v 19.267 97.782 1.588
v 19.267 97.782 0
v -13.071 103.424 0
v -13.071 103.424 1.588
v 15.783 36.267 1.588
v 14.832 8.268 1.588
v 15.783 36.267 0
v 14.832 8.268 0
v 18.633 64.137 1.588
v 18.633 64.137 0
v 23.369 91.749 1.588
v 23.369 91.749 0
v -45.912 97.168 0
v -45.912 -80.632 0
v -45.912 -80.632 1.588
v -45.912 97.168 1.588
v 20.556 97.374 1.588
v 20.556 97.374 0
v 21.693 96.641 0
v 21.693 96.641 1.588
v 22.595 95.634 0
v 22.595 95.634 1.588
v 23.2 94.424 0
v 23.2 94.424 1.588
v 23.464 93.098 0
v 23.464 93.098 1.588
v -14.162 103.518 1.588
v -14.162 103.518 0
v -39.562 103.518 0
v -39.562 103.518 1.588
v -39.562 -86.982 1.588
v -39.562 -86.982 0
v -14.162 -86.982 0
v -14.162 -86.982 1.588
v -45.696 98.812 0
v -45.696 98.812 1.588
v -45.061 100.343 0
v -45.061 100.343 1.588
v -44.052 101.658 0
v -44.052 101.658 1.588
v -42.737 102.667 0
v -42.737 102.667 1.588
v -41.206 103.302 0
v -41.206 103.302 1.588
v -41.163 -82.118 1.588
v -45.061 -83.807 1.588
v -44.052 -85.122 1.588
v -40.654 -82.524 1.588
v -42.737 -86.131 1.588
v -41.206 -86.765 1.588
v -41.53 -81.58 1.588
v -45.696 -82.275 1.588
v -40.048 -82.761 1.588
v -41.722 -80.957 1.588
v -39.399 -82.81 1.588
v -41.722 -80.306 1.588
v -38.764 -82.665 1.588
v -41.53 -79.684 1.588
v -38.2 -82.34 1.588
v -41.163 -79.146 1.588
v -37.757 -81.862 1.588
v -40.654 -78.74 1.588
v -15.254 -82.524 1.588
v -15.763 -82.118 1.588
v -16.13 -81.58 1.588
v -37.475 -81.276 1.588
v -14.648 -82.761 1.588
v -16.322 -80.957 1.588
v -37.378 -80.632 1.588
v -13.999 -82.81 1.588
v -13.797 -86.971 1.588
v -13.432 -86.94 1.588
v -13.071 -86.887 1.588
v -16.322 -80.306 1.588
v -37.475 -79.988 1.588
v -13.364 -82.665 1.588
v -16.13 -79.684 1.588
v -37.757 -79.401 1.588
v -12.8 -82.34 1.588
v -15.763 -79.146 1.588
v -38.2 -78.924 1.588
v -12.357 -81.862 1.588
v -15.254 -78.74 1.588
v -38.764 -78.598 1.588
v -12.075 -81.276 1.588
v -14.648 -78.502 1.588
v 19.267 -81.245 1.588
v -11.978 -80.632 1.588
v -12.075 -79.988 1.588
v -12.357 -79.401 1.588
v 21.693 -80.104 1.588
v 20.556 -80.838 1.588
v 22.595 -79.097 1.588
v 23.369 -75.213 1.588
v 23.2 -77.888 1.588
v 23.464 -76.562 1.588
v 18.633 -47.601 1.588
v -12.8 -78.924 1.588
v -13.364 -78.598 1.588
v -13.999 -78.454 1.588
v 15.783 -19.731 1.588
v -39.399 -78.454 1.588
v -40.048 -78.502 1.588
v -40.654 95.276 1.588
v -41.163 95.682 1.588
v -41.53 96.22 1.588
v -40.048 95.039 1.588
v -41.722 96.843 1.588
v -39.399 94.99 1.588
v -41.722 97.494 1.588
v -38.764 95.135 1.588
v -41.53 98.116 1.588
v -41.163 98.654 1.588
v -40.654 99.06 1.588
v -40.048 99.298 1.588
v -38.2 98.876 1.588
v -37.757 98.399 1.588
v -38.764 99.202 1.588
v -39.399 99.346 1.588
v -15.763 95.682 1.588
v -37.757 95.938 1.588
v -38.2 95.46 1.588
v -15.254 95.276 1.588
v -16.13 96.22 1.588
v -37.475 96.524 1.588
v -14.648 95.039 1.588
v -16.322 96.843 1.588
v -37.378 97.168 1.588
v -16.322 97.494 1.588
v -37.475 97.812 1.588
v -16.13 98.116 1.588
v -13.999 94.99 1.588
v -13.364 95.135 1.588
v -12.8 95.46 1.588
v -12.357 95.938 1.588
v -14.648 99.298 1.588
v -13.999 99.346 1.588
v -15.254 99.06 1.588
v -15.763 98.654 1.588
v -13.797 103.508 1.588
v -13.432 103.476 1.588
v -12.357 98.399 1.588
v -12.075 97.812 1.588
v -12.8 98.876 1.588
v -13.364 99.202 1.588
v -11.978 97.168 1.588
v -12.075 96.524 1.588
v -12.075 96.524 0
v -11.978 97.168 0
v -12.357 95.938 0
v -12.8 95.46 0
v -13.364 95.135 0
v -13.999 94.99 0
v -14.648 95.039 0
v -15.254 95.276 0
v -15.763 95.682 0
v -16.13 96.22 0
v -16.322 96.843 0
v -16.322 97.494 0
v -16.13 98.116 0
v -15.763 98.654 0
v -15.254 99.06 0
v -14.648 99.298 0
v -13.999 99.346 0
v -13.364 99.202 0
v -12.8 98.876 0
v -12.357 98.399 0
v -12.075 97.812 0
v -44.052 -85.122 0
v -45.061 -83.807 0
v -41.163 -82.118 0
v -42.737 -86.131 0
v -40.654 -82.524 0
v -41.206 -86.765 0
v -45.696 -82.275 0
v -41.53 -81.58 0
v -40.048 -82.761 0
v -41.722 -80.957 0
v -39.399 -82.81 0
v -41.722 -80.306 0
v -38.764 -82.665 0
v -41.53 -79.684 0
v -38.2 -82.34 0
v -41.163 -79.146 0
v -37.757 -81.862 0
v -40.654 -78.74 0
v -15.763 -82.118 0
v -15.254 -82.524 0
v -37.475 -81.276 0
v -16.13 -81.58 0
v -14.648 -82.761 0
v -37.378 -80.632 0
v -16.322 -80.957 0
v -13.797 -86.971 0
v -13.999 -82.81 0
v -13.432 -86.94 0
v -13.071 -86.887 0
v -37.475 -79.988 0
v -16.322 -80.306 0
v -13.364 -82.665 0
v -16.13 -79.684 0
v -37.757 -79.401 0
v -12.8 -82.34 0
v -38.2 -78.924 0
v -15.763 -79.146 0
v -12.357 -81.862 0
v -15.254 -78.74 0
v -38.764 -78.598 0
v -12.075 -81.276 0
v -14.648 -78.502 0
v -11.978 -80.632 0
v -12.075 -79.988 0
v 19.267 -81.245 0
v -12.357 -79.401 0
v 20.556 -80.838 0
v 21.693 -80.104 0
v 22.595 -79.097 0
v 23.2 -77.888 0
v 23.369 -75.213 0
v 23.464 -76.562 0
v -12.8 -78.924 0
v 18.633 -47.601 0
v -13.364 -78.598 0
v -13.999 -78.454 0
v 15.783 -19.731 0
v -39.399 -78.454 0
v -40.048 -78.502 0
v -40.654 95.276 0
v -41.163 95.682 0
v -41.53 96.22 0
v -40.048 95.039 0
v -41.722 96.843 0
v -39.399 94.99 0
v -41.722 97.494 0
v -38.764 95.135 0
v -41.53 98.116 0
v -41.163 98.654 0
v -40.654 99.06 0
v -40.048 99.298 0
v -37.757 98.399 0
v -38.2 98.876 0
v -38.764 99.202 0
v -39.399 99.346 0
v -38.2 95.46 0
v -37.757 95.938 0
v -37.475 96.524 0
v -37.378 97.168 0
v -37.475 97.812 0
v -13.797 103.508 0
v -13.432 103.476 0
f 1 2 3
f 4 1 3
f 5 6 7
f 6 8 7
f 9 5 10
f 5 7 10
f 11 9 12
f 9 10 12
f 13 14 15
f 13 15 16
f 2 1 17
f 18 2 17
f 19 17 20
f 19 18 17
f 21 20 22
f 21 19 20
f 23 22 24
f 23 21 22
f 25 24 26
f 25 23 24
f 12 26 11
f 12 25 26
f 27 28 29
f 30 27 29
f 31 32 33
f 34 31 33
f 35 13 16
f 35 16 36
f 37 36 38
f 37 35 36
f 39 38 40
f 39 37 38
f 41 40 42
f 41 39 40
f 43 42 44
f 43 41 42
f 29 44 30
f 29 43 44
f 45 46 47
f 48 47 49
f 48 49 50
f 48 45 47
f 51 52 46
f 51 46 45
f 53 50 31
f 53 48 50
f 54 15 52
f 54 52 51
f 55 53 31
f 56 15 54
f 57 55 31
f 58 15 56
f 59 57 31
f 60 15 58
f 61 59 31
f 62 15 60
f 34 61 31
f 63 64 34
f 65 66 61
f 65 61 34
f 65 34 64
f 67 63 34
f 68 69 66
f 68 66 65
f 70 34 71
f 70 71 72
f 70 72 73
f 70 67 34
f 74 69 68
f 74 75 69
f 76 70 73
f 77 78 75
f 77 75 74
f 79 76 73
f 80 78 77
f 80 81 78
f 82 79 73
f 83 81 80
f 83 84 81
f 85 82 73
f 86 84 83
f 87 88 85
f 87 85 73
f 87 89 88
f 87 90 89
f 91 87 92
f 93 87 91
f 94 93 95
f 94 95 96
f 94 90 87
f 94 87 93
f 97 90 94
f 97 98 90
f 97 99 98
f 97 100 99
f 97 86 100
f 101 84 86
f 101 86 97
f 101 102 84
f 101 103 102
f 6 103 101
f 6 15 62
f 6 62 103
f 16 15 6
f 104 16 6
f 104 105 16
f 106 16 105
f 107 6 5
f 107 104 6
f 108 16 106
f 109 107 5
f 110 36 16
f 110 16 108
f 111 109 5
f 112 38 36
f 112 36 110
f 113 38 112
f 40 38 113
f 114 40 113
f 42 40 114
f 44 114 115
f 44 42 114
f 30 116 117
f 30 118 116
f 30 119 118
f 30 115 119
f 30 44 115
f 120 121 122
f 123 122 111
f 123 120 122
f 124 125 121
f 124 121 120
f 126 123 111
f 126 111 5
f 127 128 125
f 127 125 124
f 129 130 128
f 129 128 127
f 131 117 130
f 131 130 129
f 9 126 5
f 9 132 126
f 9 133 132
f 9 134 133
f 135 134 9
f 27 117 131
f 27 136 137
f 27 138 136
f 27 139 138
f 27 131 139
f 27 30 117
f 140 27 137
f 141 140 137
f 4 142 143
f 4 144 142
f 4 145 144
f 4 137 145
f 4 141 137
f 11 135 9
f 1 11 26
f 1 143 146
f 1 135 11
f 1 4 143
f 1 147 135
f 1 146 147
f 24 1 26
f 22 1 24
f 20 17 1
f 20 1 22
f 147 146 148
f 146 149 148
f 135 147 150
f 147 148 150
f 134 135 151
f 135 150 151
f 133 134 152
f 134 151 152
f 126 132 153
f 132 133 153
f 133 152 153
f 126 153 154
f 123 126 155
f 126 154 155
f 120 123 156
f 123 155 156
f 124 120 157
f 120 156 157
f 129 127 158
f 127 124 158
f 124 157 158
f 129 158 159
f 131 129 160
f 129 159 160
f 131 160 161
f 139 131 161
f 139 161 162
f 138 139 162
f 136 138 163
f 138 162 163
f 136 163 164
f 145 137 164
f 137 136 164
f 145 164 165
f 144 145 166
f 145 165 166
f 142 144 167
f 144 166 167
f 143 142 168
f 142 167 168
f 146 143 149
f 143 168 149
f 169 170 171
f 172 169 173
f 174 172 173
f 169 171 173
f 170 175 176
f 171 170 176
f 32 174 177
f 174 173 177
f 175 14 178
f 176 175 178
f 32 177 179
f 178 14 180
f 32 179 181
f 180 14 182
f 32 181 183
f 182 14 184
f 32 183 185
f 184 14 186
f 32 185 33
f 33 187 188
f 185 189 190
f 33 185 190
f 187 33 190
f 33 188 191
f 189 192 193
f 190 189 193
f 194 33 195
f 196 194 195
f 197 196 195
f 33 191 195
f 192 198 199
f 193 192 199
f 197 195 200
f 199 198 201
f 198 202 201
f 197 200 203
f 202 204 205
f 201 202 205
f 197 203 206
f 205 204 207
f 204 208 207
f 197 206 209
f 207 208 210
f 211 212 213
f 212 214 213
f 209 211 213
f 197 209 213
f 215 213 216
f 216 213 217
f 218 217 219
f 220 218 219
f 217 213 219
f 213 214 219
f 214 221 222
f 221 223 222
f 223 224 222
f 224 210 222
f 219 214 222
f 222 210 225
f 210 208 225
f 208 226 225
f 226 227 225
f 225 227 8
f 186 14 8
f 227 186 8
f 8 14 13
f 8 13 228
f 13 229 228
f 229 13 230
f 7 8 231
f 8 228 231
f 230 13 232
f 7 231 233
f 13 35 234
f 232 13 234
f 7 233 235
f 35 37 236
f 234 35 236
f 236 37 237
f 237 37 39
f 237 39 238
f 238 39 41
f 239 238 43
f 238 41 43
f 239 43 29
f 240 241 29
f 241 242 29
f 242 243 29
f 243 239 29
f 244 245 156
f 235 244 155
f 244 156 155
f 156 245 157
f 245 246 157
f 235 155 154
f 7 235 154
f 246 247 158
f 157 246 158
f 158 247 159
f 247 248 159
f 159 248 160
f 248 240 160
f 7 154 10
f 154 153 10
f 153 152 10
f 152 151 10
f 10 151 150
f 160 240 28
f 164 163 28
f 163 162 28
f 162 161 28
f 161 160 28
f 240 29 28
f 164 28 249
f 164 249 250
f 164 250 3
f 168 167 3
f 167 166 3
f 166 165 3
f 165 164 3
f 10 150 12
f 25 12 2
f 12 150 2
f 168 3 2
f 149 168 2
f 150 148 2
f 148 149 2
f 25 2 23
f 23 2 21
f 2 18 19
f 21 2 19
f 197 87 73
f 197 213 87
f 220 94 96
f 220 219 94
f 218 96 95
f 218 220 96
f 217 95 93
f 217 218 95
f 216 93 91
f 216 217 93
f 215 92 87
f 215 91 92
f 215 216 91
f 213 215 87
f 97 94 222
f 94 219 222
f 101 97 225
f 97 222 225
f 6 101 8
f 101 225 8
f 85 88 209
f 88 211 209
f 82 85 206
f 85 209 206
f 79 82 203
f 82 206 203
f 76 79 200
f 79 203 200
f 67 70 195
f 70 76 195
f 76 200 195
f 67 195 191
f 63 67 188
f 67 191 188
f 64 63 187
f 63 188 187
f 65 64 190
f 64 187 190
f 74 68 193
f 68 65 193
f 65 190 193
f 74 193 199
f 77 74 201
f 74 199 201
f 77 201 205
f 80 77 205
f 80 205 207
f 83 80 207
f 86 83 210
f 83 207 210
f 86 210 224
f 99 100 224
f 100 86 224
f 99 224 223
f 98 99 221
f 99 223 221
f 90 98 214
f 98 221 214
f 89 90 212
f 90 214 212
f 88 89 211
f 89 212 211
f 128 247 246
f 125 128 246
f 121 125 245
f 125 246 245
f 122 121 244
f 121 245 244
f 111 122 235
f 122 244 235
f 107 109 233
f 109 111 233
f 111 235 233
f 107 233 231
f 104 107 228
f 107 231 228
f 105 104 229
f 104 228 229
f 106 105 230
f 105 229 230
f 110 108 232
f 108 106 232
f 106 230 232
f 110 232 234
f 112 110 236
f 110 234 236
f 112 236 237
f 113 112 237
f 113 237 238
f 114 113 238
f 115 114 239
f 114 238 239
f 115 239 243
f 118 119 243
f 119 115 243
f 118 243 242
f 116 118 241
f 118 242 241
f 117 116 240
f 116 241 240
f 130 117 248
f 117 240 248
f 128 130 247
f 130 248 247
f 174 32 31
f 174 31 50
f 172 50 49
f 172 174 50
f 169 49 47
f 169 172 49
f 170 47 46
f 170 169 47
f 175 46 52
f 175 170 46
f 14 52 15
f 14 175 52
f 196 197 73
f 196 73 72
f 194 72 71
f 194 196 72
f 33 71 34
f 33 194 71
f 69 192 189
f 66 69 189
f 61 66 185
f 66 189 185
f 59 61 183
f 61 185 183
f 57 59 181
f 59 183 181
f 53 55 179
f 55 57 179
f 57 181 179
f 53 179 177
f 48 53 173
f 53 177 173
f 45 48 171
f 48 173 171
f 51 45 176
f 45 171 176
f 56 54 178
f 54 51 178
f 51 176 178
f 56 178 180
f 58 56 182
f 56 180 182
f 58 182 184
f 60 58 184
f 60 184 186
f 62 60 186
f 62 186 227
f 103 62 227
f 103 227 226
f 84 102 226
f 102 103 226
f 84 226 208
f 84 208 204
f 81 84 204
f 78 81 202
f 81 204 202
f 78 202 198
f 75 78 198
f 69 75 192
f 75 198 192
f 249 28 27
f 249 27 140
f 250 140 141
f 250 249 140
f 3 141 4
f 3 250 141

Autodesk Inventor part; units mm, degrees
ref_plane "YZ Plane" through (0, 0, 0) normal (1, 0, 0) x (0, 1, 0)
ref_plane "XZ Plane" through (0, 0, 0) normal (0, 1, 0) x (-1, 0, 0)
ref_plane "XY Plane" through (0, 0, 0) normal (0, 0, 1) x (1, 0, 0)
sketch "Sketch1" plane through (0, 0, 0) normal (0, 0, 1) x (1, 0, 0)
  circle A0 centre (-39.5621, -80.6318) radius 2.1844
  circle A1 centre (-14.1621, -80.6318) radius 2.1844
  circle A2 centre (-14.1621, 97.1682) radius 2.1844
  circle A3 centre (-39.5621, 97.1682) radius 2.1844
  arc A4 (19.2671, -81.2453) -> (23.3688, -75.2127) centre (18.394, -76.2409) ccw
  line L0 (19.2671, -81.2453) -> (-13.0707, -86.8873)
  arc A5 (14.8318, 8.2682) -> (23.3688, -75.2127) centre (427.2689, 8.2682) ccw
  arc A6 (23.3688, 91.749) -> (14.8318, 8.2682) centre (427.2689, 8.2682) ccw
  arc A7 (23.3688, 91.749) -> (19.2671, 97.7816) centre (18.394, 92.7772) ccw
  line L1 (19.2671, 97.7816) -> (-13.0707, 103.4237)
  line L2 (-39.5621, -86.9818) -> (-14.1621, -86.9818)
  line L3 (-14.1621, 103.5182) -> (-39.5621, 103.5182)
  line L4 (-45.9121, -80.6318) -> (-45.9121, 97.1682)
  arc A8 (-45.9121, -80.6318) -> (-39.5621, -86.9818) centre (-39.5621, -80.6318) ccw
  arc A9 (-14.1621, -86.9818) -> (-13.0707, -86.8873) centre (-14.1621, -80.6318) ccw
  arc A10 (-13.0707, 103.4237) -> (-14.1621, 103.5182) centre (-14.1621, 97.1682) ccw
  arc A11 (-39.5621, 103.5182) -> (-45.9121, 97.1682) centre (-39.5621, 97.1682) ccw
  point P0 (0, 0)
  dimension "d0" = 5.08
extrude "Extrusion1" add sketch "Sketch1" along normal blind 1.5875
properties part number "wedge"
